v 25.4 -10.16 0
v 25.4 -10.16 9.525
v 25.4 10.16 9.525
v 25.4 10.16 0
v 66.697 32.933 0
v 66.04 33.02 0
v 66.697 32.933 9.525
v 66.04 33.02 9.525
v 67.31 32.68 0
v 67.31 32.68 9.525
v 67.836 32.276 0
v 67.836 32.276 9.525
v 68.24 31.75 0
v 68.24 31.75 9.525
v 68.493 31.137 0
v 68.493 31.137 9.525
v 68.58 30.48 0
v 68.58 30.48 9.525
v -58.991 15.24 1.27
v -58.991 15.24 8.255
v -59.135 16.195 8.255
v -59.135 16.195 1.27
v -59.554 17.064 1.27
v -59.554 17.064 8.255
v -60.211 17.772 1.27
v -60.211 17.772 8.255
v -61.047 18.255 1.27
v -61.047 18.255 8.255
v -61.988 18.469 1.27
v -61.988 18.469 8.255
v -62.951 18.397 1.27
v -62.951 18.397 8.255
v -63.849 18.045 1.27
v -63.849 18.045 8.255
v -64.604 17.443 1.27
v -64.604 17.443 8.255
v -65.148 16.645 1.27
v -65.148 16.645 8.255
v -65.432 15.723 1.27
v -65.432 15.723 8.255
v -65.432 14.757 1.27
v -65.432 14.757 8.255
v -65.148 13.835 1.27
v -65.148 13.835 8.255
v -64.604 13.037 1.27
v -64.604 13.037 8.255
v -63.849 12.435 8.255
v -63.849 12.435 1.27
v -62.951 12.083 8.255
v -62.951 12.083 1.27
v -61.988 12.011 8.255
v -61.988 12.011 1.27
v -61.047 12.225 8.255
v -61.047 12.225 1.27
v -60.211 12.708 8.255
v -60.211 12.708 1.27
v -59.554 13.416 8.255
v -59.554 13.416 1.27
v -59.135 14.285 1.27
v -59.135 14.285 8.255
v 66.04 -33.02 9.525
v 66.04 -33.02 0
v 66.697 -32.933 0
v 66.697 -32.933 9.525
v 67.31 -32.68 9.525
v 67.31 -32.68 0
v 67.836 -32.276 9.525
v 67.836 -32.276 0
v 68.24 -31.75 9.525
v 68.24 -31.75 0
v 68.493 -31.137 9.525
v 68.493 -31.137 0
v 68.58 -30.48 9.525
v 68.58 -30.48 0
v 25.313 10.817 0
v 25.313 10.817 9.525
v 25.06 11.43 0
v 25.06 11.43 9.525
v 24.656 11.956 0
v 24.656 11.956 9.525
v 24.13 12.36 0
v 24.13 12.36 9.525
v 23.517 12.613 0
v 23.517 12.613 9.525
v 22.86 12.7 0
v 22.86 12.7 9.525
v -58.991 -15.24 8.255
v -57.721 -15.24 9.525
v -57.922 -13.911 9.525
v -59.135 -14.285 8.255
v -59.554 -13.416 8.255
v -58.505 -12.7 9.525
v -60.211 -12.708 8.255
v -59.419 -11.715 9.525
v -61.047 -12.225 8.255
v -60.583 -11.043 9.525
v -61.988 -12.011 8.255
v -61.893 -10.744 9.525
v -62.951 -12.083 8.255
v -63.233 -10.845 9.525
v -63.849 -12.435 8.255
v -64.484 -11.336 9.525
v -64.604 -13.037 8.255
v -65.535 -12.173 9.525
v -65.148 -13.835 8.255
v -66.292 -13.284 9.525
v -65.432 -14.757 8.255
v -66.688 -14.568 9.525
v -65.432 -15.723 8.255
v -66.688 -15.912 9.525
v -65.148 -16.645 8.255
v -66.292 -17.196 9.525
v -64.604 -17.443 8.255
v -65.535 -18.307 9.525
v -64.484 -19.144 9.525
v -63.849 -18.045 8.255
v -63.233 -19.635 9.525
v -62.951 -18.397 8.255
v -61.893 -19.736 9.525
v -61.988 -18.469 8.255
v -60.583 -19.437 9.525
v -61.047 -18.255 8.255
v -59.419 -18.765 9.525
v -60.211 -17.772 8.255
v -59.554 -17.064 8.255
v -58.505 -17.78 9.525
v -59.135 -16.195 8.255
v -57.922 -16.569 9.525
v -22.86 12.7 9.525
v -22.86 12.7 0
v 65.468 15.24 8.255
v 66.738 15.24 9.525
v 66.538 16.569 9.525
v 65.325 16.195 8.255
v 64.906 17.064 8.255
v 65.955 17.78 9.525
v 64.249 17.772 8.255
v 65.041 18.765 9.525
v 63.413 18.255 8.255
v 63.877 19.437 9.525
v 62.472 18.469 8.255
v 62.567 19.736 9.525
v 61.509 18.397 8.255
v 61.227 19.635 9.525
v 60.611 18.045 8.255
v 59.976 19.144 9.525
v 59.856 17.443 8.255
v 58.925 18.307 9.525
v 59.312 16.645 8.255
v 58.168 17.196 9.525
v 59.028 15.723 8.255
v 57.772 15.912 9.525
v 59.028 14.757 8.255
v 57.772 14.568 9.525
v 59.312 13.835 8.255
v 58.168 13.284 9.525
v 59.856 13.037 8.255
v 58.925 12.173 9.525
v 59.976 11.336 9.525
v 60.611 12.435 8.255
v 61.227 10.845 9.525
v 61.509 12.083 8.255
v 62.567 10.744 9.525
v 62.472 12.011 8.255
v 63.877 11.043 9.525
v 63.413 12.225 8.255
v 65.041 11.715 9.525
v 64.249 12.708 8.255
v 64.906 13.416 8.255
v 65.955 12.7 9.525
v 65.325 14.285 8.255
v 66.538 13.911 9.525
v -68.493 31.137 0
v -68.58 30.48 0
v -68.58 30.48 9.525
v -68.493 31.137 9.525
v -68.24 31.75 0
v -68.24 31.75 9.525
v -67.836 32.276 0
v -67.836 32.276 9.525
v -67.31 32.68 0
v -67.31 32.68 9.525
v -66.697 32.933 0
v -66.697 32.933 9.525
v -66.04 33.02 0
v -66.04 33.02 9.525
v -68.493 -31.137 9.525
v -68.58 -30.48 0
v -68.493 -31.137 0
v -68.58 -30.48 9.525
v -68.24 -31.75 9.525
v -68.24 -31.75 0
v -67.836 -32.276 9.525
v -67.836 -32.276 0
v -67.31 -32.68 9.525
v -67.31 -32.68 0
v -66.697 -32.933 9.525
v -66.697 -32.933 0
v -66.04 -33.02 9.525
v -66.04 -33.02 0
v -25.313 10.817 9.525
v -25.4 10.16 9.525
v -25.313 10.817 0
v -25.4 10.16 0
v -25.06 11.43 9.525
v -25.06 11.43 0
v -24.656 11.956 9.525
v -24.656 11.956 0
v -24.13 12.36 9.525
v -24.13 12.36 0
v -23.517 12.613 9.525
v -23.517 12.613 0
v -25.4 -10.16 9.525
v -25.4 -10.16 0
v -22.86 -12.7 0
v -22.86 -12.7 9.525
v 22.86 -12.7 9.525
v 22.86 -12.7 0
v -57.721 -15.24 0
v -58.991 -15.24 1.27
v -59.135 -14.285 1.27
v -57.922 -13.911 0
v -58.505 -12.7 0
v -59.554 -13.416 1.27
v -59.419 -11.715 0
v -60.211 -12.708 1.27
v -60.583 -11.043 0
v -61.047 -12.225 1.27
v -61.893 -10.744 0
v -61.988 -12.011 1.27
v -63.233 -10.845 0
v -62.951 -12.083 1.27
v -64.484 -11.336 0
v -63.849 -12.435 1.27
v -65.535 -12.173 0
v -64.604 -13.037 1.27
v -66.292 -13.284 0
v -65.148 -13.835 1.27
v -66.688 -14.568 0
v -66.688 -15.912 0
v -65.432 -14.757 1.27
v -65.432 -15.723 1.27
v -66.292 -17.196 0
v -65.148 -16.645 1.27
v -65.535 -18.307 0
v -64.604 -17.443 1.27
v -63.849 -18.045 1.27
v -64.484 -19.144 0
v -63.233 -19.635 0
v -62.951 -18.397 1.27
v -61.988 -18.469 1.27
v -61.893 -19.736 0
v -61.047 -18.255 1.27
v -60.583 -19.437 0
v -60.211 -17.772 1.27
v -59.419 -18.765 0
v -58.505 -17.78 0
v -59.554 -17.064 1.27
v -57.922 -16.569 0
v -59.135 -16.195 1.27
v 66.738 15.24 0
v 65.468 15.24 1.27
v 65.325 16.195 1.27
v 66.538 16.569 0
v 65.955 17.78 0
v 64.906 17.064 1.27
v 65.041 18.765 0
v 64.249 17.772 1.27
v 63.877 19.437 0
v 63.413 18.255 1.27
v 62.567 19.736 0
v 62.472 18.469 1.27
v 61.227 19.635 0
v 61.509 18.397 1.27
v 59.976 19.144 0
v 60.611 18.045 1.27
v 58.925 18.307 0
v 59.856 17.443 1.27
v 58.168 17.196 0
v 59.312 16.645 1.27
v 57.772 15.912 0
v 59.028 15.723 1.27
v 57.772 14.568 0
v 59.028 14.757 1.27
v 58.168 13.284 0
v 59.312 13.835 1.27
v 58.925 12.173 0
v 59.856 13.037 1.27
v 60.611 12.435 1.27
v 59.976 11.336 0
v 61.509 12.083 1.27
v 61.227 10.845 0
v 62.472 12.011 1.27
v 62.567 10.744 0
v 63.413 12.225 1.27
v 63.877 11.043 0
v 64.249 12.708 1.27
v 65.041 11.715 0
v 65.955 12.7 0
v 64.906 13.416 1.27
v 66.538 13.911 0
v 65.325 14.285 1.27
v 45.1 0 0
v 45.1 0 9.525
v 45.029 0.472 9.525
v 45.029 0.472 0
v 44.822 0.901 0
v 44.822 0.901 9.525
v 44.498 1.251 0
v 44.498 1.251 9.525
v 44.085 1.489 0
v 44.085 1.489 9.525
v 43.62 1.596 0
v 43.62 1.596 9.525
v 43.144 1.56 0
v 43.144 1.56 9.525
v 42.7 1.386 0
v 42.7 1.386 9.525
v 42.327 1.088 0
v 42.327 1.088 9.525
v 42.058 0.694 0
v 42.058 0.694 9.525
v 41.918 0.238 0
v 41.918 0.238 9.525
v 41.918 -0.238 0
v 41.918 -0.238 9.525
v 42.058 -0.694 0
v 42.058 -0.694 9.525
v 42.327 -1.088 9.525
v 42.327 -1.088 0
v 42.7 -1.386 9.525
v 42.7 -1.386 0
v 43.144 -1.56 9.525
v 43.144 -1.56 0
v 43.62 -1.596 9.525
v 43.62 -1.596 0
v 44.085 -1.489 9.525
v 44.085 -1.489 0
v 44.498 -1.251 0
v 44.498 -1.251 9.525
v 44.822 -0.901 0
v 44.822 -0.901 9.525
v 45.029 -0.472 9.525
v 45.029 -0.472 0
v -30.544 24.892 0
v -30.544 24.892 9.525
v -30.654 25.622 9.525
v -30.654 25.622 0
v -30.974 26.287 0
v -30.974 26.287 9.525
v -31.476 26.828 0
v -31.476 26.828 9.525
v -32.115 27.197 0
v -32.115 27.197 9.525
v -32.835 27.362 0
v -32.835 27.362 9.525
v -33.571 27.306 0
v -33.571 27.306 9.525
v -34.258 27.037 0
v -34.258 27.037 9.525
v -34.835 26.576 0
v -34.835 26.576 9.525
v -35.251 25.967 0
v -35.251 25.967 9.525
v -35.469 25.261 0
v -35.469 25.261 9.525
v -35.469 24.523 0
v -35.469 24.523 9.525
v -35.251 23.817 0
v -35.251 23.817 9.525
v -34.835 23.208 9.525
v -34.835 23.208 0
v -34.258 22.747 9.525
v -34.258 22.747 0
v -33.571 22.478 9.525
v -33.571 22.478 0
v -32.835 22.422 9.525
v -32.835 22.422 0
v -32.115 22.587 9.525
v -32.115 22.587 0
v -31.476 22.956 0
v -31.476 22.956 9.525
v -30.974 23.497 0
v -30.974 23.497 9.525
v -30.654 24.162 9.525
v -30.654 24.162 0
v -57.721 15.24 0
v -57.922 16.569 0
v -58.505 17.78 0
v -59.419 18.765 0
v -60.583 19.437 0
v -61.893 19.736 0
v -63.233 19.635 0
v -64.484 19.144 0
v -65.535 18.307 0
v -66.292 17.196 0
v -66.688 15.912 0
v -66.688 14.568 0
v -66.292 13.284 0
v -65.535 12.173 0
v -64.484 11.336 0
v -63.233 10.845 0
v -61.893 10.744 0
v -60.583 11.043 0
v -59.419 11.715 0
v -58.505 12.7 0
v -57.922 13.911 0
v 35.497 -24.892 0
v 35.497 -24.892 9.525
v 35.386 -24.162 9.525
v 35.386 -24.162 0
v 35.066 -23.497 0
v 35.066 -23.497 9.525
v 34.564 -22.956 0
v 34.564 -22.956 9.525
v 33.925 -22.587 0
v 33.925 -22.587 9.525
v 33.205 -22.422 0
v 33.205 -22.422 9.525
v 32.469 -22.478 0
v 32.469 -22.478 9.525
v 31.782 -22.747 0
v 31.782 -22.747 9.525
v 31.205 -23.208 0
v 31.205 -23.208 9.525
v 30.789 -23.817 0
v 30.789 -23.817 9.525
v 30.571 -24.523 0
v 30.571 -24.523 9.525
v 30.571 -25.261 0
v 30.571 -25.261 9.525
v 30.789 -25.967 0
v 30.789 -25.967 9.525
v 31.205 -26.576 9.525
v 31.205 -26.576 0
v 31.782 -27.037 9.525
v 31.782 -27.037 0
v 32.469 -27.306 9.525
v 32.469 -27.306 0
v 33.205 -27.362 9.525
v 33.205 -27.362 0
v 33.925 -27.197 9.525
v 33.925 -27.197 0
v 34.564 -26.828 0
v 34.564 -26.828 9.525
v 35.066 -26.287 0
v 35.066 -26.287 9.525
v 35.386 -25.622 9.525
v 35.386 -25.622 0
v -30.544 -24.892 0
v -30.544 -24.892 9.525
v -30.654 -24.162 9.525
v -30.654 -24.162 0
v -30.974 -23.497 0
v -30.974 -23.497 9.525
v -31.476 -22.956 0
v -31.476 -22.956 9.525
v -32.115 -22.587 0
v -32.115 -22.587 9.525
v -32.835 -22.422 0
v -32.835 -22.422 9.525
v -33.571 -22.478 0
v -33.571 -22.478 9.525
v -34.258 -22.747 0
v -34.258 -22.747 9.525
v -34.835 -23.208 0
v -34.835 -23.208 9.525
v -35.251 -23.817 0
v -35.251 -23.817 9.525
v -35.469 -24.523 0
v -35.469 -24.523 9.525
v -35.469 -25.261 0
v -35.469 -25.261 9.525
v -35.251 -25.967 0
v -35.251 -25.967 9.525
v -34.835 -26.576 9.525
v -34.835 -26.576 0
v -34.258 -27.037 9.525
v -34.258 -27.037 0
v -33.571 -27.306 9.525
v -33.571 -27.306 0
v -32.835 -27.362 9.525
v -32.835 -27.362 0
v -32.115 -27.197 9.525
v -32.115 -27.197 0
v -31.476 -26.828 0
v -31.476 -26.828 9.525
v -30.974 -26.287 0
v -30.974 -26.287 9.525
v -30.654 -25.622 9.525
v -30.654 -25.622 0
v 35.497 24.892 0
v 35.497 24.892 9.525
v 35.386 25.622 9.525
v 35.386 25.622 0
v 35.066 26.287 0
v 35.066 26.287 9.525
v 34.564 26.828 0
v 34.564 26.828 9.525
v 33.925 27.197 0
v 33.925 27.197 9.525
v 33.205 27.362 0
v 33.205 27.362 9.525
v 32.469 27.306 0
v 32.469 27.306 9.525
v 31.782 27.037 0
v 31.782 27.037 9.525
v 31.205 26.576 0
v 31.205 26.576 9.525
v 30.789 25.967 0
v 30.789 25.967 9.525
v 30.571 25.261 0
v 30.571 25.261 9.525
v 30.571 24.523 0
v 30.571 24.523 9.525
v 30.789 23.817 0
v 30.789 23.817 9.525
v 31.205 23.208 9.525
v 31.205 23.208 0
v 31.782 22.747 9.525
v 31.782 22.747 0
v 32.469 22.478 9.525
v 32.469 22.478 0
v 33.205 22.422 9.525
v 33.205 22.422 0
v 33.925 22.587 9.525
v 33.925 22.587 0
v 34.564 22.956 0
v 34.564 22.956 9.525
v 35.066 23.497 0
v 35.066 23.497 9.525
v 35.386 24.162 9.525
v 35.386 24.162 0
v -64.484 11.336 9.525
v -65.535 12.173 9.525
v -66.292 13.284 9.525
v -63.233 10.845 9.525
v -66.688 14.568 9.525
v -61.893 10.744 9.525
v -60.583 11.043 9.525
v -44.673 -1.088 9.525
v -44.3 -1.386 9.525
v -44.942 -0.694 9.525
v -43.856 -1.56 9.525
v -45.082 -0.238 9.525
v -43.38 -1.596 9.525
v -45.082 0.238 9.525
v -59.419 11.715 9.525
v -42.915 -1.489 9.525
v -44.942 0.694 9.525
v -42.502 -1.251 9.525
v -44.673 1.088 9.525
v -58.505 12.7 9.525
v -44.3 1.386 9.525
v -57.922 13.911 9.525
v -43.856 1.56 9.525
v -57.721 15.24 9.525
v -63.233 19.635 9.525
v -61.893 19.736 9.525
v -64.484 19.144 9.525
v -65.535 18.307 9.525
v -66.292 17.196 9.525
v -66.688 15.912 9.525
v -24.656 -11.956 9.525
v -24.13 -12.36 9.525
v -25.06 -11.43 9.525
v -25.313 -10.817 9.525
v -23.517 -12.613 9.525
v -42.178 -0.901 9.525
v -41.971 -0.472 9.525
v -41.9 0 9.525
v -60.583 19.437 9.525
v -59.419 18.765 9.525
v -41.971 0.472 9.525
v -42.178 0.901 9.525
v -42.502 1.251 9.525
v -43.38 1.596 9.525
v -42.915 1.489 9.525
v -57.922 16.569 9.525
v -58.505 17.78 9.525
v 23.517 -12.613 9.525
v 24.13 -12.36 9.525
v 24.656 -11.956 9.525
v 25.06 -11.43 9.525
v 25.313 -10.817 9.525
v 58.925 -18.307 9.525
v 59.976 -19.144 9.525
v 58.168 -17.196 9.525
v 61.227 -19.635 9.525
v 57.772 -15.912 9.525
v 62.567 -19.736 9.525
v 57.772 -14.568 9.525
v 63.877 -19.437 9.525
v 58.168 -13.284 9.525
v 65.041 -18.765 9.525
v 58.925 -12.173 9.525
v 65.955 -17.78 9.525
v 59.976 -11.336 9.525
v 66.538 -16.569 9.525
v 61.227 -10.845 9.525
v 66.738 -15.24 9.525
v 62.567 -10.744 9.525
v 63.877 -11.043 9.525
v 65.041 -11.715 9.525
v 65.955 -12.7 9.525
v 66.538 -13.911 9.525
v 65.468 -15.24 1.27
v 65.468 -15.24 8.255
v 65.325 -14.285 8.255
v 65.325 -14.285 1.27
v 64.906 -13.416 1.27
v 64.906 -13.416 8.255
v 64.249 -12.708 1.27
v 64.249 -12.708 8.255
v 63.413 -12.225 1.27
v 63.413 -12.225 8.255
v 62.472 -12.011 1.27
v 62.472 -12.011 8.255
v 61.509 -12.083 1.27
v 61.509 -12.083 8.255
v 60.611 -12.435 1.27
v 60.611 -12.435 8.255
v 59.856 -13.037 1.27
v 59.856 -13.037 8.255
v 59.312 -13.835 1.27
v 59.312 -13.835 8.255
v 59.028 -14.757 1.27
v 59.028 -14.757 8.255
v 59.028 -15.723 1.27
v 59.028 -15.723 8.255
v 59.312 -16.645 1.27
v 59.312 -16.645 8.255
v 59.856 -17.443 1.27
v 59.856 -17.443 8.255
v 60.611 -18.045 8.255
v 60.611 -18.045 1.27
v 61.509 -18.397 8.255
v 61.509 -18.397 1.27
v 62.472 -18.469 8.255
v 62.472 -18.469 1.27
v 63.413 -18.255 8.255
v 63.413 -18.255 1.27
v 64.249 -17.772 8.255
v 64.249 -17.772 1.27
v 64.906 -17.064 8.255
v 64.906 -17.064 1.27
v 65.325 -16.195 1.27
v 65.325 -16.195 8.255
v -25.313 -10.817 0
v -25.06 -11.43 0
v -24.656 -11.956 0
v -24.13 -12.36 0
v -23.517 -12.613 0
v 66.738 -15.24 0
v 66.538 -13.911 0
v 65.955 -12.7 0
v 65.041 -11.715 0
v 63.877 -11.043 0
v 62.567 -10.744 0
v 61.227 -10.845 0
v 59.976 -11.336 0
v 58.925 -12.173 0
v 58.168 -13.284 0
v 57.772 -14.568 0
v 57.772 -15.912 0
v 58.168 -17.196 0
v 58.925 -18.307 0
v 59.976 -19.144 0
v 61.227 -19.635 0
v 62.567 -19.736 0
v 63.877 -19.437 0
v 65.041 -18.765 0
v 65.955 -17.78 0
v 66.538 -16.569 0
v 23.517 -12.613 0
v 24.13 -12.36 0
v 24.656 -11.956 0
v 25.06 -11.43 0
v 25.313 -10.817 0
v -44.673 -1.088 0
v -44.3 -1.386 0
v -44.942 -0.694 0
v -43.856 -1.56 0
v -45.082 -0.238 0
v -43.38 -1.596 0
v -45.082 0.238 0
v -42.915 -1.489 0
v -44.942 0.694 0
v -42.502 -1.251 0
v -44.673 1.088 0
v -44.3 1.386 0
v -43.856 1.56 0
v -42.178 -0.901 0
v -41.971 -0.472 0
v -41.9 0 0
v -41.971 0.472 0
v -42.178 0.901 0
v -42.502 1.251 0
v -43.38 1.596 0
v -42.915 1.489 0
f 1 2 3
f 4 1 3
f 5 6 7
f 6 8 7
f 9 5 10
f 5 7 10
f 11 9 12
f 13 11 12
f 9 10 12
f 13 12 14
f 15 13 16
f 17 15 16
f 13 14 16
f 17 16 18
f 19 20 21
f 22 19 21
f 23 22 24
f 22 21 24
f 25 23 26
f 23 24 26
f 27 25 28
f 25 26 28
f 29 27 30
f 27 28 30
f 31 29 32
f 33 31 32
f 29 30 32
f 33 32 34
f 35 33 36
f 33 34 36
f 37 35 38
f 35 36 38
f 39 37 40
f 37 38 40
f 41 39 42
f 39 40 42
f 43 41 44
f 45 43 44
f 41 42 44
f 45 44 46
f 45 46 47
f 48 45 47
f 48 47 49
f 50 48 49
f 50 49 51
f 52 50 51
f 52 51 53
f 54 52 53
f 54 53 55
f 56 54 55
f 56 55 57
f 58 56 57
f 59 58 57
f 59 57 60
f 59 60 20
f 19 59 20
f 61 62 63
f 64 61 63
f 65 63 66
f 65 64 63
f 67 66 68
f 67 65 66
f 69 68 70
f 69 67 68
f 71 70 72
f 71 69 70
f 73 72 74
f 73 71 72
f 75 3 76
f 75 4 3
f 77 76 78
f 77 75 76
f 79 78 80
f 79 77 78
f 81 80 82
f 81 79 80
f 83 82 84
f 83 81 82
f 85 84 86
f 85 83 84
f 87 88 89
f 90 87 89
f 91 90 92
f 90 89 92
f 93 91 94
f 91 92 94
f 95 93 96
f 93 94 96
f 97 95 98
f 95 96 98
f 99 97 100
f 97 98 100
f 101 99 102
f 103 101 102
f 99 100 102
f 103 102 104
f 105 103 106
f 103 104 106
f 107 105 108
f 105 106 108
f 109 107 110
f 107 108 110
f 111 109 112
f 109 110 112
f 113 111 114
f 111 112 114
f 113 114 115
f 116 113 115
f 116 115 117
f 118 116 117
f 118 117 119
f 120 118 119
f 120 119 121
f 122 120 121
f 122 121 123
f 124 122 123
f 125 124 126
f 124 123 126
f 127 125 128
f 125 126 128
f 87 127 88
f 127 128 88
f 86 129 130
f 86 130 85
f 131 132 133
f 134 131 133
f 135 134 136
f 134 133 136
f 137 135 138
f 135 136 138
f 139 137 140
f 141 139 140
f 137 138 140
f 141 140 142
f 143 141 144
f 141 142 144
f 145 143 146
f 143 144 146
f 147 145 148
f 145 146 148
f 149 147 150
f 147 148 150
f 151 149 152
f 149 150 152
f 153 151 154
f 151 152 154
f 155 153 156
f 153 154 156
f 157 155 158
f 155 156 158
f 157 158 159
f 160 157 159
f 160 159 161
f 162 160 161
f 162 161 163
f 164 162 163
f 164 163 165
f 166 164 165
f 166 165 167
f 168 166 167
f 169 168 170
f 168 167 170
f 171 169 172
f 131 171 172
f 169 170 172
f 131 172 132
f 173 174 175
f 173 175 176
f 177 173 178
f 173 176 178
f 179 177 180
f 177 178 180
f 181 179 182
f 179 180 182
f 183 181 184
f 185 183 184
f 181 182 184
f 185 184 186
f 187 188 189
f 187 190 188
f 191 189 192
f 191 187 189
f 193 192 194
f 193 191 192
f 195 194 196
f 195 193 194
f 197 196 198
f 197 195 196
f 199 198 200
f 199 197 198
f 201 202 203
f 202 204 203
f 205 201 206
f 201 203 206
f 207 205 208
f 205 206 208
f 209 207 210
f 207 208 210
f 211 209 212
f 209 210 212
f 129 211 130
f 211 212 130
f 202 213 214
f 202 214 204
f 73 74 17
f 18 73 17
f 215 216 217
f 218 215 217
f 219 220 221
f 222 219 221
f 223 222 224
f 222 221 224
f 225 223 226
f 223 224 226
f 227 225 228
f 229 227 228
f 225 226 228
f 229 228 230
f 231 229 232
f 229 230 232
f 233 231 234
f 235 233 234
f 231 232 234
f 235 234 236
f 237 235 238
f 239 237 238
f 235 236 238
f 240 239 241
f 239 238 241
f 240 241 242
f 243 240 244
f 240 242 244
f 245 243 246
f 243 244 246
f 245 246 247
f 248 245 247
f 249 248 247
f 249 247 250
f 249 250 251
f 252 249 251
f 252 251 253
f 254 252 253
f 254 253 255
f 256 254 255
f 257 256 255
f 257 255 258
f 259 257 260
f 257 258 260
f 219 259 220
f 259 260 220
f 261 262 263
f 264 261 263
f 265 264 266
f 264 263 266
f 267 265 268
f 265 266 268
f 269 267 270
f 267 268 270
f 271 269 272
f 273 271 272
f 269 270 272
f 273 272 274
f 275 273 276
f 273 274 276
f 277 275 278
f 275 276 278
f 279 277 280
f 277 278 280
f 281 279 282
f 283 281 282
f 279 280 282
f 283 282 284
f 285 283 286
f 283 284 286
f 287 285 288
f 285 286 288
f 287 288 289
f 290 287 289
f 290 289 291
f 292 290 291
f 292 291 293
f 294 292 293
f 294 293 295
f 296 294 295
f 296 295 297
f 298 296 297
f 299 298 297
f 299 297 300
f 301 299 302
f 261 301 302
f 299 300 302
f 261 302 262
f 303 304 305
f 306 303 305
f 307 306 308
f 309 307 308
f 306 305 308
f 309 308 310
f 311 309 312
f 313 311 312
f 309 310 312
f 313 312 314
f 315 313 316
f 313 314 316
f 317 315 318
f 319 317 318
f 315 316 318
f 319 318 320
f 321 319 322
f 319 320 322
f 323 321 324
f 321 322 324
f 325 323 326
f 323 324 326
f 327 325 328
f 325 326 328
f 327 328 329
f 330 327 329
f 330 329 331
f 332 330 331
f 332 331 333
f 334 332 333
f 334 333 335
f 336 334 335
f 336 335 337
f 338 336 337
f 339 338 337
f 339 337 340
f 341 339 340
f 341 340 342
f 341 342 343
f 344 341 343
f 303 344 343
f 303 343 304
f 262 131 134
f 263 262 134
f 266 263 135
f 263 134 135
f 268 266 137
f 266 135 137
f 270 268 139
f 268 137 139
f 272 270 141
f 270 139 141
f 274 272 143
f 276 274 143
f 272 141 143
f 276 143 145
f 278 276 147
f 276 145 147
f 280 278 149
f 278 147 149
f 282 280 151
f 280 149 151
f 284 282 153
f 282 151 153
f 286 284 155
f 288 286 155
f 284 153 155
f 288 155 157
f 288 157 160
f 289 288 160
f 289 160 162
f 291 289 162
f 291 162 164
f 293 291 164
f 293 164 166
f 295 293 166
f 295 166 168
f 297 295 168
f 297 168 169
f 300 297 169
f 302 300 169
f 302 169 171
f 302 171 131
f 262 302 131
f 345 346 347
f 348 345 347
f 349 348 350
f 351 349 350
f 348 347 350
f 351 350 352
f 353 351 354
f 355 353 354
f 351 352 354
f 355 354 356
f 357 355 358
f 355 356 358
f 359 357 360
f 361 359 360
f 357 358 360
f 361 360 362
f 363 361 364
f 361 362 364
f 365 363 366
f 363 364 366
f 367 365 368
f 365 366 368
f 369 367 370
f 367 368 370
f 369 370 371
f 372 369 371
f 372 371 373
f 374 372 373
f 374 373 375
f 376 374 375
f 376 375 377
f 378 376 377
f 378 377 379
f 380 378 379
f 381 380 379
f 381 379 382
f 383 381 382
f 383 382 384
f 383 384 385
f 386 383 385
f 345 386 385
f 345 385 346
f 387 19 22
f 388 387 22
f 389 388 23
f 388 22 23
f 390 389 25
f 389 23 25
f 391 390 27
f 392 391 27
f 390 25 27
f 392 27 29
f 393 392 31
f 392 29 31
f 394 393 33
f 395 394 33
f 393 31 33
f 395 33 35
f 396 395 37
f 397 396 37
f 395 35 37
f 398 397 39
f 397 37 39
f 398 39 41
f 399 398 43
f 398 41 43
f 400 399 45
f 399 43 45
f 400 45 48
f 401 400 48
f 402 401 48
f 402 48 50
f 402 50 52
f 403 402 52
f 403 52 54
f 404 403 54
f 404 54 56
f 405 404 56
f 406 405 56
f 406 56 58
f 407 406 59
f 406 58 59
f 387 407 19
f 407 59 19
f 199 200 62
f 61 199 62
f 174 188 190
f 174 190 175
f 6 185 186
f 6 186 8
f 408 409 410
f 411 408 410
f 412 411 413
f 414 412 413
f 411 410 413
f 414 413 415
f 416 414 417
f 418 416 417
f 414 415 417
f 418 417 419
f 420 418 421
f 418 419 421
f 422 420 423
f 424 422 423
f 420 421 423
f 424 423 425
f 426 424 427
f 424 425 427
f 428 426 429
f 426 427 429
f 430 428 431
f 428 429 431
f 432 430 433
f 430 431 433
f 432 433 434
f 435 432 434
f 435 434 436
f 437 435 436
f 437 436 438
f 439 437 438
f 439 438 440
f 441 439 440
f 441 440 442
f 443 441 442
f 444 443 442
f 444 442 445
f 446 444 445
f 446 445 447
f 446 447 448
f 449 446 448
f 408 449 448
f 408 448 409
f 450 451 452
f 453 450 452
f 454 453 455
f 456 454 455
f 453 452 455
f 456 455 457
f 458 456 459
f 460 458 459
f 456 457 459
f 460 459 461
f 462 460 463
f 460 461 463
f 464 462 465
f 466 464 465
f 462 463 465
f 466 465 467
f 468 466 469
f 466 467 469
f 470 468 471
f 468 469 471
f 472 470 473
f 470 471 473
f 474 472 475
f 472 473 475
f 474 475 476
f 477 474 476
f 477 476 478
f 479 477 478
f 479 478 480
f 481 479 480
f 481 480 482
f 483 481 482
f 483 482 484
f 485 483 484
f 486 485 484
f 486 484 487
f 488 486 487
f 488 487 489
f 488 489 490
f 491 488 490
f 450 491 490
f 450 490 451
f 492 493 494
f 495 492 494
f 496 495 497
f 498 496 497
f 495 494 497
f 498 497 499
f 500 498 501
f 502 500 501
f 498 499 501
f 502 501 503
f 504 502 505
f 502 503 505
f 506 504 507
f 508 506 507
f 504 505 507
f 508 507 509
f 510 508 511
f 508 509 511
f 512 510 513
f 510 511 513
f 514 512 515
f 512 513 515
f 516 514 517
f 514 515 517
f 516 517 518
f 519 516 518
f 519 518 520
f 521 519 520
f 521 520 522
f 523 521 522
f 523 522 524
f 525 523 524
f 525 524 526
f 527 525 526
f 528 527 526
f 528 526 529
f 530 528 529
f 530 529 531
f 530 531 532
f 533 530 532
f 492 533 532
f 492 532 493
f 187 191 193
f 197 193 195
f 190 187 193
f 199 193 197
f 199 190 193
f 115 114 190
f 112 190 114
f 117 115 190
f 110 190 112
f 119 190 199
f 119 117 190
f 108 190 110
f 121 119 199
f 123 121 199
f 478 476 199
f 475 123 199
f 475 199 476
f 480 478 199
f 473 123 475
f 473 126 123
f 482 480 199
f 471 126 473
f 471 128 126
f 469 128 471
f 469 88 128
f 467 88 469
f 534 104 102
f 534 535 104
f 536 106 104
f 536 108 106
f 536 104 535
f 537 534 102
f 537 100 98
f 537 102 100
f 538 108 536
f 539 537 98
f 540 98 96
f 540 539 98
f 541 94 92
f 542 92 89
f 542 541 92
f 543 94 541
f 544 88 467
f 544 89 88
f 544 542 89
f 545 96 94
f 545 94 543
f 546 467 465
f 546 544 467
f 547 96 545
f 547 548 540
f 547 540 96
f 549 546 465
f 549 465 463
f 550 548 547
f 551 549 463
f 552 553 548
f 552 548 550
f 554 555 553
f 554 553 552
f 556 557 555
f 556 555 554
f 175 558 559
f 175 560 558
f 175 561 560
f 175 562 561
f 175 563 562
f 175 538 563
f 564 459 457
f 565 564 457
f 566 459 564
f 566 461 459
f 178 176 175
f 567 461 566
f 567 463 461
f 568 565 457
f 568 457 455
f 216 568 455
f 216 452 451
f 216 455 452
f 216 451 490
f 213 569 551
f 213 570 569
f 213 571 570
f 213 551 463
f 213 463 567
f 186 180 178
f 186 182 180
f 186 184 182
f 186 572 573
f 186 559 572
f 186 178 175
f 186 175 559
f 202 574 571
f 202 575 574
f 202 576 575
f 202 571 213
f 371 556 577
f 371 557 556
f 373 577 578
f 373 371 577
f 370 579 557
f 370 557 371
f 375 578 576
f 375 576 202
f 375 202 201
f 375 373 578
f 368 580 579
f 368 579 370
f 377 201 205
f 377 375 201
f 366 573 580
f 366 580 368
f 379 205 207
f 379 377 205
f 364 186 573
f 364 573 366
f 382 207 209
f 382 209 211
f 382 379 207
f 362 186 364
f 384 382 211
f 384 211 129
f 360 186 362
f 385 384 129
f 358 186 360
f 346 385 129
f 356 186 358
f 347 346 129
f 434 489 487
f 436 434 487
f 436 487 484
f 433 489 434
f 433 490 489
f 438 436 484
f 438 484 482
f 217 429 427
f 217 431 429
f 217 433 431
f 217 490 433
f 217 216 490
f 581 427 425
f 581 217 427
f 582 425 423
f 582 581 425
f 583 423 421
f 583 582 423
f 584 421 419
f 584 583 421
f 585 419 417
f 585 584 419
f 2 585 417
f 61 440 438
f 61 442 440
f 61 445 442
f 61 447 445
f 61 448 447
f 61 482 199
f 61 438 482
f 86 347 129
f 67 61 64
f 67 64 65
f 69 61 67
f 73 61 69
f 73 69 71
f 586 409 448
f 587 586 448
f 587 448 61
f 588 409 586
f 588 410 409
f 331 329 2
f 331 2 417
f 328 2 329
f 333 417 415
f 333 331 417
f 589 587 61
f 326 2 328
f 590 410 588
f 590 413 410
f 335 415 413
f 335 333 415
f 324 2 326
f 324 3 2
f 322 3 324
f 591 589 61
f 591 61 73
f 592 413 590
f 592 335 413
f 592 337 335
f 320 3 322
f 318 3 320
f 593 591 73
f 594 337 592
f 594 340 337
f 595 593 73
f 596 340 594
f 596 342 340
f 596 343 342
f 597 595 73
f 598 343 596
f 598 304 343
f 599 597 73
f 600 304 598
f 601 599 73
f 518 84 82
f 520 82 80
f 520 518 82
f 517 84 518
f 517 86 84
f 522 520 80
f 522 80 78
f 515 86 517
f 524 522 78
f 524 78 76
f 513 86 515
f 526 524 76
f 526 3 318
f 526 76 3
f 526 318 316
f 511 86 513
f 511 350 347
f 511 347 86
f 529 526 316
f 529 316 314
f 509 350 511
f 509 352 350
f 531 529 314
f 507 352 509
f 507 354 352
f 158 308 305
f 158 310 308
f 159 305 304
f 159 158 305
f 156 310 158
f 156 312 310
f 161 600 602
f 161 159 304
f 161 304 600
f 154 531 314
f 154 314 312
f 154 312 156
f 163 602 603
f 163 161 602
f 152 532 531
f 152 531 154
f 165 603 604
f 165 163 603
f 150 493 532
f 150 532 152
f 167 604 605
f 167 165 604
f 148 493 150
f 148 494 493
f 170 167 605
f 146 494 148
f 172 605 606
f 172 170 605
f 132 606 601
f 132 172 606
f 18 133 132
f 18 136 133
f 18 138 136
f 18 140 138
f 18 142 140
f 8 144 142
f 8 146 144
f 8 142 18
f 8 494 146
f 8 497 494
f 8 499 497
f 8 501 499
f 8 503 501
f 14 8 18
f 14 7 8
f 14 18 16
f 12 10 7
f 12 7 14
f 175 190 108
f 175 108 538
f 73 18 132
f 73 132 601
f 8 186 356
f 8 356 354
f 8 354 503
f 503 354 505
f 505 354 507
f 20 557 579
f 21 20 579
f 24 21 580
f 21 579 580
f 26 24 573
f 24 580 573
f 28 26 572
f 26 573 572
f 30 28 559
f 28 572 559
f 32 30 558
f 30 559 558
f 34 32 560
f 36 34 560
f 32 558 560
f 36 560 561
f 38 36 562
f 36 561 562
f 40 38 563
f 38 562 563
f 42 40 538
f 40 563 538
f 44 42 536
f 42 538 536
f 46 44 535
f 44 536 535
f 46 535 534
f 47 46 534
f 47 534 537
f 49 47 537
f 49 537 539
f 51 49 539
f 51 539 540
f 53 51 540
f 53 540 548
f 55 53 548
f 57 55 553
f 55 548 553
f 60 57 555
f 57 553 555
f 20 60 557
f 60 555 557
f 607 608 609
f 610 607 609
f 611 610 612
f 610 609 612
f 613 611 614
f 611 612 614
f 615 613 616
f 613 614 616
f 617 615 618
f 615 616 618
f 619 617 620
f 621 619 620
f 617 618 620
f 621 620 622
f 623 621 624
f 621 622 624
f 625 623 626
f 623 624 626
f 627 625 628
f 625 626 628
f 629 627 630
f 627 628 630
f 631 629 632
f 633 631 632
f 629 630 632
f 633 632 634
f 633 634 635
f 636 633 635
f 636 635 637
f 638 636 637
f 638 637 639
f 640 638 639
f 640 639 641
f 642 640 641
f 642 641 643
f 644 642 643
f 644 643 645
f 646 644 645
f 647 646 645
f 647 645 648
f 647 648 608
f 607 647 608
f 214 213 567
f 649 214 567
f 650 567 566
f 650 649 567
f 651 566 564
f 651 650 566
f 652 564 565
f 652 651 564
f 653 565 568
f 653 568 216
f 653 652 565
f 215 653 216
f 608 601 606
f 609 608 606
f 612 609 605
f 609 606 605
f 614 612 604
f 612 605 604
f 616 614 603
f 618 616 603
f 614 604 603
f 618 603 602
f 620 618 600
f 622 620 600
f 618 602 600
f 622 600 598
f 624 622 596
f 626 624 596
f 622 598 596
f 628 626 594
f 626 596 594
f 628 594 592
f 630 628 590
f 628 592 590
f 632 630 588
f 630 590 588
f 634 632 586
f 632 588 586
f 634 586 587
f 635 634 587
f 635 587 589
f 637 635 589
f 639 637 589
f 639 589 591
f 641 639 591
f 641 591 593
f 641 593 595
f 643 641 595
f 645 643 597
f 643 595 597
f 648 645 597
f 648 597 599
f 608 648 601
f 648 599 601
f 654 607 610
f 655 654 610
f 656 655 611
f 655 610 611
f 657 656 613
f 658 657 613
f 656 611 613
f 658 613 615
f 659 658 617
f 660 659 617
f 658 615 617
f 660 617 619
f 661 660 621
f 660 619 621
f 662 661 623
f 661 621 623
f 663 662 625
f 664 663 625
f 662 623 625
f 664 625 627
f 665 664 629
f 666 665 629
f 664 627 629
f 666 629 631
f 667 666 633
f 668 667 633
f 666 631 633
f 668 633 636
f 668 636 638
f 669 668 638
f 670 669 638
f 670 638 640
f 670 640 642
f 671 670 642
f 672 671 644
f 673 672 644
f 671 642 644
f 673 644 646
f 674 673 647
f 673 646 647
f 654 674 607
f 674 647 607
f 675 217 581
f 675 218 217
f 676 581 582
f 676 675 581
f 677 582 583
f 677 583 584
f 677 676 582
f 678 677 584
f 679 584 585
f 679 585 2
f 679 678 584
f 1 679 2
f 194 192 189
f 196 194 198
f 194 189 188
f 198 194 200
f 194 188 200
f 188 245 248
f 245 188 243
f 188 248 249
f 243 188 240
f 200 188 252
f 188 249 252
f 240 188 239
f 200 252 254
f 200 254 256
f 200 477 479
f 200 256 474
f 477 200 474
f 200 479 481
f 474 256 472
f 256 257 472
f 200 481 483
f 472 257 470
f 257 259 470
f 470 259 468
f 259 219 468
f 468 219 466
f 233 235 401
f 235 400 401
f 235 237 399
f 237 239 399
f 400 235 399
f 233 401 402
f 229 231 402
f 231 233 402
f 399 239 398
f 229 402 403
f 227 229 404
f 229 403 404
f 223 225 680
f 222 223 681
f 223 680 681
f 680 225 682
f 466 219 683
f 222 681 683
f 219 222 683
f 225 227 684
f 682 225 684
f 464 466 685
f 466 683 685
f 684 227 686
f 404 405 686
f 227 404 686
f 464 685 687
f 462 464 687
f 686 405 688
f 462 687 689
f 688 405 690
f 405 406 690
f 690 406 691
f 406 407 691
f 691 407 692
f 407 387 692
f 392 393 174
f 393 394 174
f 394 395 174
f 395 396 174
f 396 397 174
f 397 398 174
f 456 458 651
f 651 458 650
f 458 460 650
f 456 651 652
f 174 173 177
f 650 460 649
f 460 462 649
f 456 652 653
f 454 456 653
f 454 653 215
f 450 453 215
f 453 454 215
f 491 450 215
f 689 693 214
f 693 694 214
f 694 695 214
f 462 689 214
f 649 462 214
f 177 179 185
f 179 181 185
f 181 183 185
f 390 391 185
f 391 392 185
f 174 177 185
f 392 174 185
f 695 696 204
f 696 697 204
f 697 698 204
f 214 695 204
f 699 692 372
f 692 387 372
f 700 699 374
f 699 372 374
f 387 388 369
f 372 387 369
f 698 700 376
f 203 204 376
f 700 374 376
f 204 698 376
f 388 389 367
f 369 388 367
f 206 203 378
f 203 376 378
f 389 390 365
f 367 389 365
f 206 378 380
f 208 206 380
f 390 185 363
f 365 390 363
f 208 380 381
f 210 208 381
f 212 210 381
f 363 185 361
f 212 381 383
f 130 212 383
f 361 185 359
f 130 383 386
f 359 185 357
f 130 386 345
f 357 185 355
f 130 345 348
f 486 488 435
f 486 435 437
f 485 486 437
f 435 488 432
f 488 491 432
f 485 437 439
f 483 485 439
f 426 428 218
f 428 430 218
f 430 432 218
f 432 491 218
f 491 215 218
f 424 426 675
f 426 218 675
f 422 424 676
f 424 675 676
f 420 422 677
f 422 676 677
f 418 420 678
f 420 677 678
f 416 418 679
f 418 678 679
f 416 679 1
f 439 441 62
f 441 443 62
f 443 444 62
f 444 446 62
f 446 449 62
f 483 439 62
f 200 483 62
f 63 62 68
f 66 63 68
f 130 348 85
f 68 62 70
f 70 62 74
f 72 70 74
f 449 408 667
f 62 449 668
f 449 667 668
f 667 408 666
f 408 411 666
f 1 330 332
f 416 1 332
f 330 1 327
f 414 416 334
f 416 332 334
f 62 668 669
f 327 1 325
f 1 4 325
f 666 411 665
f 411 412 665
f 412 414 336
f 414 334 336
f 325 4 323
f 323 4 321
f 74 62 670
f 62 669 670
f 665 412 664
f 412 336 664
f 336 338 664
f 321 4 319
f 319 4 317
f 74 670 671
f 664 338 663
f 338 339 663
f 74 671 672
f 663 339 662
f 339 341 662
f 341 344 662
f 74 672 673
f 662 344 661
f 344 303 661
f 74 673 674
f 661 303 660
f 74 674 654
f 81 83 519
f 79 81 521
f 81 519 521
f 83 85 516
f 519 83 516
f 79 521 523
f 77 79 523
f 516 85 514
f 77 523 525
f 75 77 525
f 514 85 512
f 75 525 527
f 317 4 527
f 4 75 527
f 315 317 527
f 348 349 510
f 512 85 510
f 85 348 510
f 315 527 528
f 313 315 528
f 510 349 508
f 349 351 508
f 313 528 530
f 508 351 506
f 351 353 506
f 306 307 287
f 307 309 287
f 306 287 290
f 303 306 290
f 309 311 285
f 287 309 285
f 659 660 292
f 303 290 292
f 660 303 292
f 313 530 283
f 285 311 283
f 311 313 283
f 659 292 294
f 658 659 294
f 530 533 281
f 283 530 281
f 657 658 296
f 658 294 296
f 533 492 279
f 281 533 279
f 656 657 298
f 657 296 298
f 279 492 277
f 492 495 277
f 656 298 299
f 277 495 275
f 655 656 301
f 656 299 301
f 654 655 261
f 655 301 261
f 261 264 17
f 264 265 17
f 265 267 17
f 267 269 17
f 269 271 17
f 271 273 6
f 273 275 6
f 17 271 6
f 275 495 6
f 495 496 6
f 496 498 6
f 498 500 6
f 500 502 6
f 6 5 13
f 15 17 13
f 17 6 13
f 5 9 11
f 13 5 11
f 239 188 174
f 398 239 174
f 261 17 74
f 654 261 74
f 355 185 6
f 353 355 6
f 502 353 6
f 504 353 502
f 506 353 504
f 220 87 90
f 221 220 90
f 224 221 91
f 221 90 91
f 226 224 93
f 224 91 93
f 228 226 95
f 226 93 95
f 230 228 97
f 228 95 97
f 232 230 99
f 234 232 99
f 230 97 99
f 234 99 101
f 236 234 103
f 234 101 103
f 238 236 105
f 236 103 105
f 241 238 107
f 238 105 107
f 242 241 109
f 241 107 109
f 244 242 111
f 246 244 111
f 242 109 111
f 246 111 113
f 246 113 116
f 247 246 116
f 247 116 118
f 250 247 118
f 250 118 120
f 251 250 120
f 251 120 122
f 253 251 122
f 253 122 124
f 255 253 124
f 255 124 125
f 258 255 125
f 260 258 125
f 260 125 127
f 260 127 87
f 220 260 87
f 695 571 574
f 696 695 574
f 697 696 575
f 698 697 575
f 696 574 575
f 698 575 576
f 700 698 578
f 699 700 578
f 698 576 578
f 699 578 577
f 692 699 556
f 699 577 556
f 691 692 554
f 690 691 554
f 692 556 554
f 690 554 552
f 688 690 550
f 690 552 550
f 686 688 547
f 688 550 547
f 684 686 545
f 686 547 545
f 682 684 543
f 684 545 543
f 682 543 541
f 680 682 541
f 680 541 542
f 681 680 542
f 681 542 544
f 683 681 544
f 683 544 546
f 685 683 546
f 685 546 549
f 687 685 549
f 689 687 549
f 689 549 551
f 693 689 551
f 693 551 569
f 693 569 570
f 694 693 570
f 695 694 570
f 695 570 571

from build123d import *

# Parameters (mm, degrees)
SKETCH1_W           = 137.16
SKETCH1_H           = 66.04
BOSS_EXTRUDE1_DEPTH = 9.525
SKETCH3_R           = 2.4765
CUT_EXTRUDE1_DEPTH  = 10.525
CUT_EXTRUDE2_REACH  = 11.525
SKETCH4_R           = 3.2385
CUT_EXTRUDE3_REACH  = 11.525
SKETCH5_R           = 1.6
CUT_EXTRUDE4_REACH  = 11.525
SKETCH6_W           = 50.8
SKETCH6_H           = 25.4
FILLET1_R           = 2.54
FILLET2_R           = 2.54
CHAMFER1_SIZE       = 1.27


with BuildPart() as part:
    # Sketch1 → Boss-Extrude1 (new body)
    with BuildSketch(Plane.XY):
        Rectangle(SKETCH1_W, SKETCH1_H)
    extrude(amount=BOSS_EXTRUDE1_DEPTH)

    # Sketch3 → Cut-Extrude1 (cut, through all)
    with BuildSketch(Plane.XY.offset(9.525)):
        with Locations((-33.02, 24.892)):
            Circle(SKETCH3_R)
        with Locations((33.02, 24.892)):
            Circle(SKETCH3_R)
        with Locations((33.02, -24.892)):
            Circle(SKETCH3_R)
        with Locations((-33.02, -24.892)):
            Circle(SKETCH3_R)
    extrude(amount=-CUT_EXTRUDE1_DEPTH, mode=Mode.SUBTRACT)

    # Sketch4 → Cut-Extrude2 (cut, up to next)
    with BuildSketch(Plane.XY.offset(9.525), mode=Mode.PRIVATE) as cut_extrude2_sk1:
        with Locations((-62.23, 15.24)):
            Circle(SKETCH4_R)
    cut_extrude2_tool1 = extrude(cut_extrude2_sk1.sketch, amount=-CUT_EXTRUDE2_REACH, mode=Mode.PRIVATE) & part.part
    add(cut_extrude2_tool1.solids().sort_by_distance((-62.23, 15.24, 9.525))[0], mode=Mode.SUBTRACT)
    # Sketch4 → Cut-Extrude2 (cut, up to next)
    with BuildSketch(Plane.XY.offset(9.525), mode=Mode.PRIVATE) as cut_extrude2_sk2:
        with Locations((62.23, 15.24)):
            Circle(SKETCH4_R)
    cut_extrude2_tool2 = extrude(cut_extrude2_sk2.sketch, amount=-CUT_EXTRUDE2_REACH, mode=Mode.PRIVATE) & part.part
    add(cut_extrude2_tool2.solids().sort_by_distance((62.23, 15.24, 9.525))[0], mode=Mode.SUBTRACT)
    # Sketch4 → Cut-Extrude2 (cut, up to next)
    with BuildSketch(Plane.XY.offset(9.525), mode=Mode.PRIVATE) as cut_extrude2_sk3:
        with Locations((62.23, -15.24)):
            Circle(SKETCH4_R)
    cut_extrude2_tool3 = extrude(cut_extrude2_sk3.sketch, amount=-CUT_EXTRUDE2_REACH, mode=Mode.PRIVATE) & part.part
    add(cut_extrude2_tool3.solids().sort_by_distance((62.23, -15.24, 9.525))[0], mode=Mode.SUBTRACT)
    # Sketch4 → Cut-Extrude2 (cut, up to next)
    with BuildSketch(Plane.XY.offset(9.525), mode=Mode.PRIVATE) as cut_extrude2_sk4:
        with Locations((-62.23, -15.24)):
            Circle(SKETCH4_R)
    cut_extrude2_tool4 = extrude(cut_extrude2_sk4.sketch, amount=-CUT_EXTRUDE2_REACH, mode=Mode.PRIVATE) & part.part
    add(cut_extrude2_tool4.solids().sort_by_distance((-62.23, -15.24, 9.525))[0], mode=Mode.SUBTRACT)

    # Sketch5 → Cut-Extrude3 (cut, up to next)
    with BuildSketch(Plane.XY.offset(9.525), mode=Mode.PRIVATE) as cut_extrude3_sk1:
        with Locations((-43.5, 0)):
            Circle(SKETCH5_R)
    cut_extrude3_tool1 = extrude(cut_extrude3_sk1.sketch, amount=-CUT_EXTRUDE3_REACH, mode=Mode.PRIVATE) & part.part
    add(cut_extrude3_tool1.solids().sort_by_distance((-43.5, 0, 9.525))[0], mode=Mode.SUBTRACT)
    # Sketch5 → Cut-Extrude3 (cut, up to next)
    with BuildSketch(Plane.XY.offset(9.525), mode=Mode.PRIVATE) as cut_extrude3_sk2:
        with Locations((43.5, 0)):
            Circle(SKETCH5_R)
    cut_extrude3_tool2 = extrude(cut_extrude3_sk2.sketch, amount=-CUT_EXTRUDE3_REACH, mode=Mode.PRIVATE) & part.part
    add(cut_extrude3_tool2.solids().sort_by_distance((43.5, 0, 9.525))[0], mode=Mode.SUBTRACT)

    # Sketch6 → Cut-Extrude4 (cut, up to next)
    with BuildSketch(Plane.XY.offset(9.525), mode=Mode.PRIVATE) as cut_extrude4_sk1:
        Rectangle(SKETCH6_W, SKETCH6_H)
    cut_extrude4_tool1 = extrude(cut_extrude4_sk1.sketch, amount=-CUT_EXTRUDE4_REACH, mode=Mode.PRIVATE) & part.part
    add(cut_extrude4_tool1.solids().sort_by_distance((0, 0, 9.525))[0], mode=Mode.SUBTRACT)

    # Fillet1
    fillet1_edges = [part.edges().sort_by_distance(p)[0] for p in [
        (68.58, -33.02, 4.7625),
        (-68.58, -33.02, 4.7625),
        (-68.58, 33.02, 4.7625),
        (68.58, 33.02, 4.7625),
    ]]
    fillet(fillet1_edges, radius=FILLET1_R)

    # Fillet2
    fillet2_edges = [part.edges().sort_by_distance(p)[0] for p in [
        (25.4, 12.7, 4.7625),
        (25.4, -12.7, 4.7625),
        (-25.4, -12.7, 4.7625),
        (-25.4, 12.7, 4.7625),
    ]]
    fillet(fillet2_edges, radius=FILLET2_R)

    # Chamfer1
    chamfer1_edges = [part.edges().sort_by_distance(p)[0] for p in [
        (-65.4685, 15.24, 0),
        (-65.4685, 15.24, 9.525),
        (58.9915, 15.24, 0),
        (58.9915, 15.24, 9.525),
        (58.9915, -15.24, 0),
        (58.9915, -15.24, 9.525),
        (-65.4685, -15.24, 0),
        (-65.4685, -15.24, 9.525),
    ]]
    chamfer(chamfer1_edges, length=CHAMFER1_SIZE)


solid = part.part
